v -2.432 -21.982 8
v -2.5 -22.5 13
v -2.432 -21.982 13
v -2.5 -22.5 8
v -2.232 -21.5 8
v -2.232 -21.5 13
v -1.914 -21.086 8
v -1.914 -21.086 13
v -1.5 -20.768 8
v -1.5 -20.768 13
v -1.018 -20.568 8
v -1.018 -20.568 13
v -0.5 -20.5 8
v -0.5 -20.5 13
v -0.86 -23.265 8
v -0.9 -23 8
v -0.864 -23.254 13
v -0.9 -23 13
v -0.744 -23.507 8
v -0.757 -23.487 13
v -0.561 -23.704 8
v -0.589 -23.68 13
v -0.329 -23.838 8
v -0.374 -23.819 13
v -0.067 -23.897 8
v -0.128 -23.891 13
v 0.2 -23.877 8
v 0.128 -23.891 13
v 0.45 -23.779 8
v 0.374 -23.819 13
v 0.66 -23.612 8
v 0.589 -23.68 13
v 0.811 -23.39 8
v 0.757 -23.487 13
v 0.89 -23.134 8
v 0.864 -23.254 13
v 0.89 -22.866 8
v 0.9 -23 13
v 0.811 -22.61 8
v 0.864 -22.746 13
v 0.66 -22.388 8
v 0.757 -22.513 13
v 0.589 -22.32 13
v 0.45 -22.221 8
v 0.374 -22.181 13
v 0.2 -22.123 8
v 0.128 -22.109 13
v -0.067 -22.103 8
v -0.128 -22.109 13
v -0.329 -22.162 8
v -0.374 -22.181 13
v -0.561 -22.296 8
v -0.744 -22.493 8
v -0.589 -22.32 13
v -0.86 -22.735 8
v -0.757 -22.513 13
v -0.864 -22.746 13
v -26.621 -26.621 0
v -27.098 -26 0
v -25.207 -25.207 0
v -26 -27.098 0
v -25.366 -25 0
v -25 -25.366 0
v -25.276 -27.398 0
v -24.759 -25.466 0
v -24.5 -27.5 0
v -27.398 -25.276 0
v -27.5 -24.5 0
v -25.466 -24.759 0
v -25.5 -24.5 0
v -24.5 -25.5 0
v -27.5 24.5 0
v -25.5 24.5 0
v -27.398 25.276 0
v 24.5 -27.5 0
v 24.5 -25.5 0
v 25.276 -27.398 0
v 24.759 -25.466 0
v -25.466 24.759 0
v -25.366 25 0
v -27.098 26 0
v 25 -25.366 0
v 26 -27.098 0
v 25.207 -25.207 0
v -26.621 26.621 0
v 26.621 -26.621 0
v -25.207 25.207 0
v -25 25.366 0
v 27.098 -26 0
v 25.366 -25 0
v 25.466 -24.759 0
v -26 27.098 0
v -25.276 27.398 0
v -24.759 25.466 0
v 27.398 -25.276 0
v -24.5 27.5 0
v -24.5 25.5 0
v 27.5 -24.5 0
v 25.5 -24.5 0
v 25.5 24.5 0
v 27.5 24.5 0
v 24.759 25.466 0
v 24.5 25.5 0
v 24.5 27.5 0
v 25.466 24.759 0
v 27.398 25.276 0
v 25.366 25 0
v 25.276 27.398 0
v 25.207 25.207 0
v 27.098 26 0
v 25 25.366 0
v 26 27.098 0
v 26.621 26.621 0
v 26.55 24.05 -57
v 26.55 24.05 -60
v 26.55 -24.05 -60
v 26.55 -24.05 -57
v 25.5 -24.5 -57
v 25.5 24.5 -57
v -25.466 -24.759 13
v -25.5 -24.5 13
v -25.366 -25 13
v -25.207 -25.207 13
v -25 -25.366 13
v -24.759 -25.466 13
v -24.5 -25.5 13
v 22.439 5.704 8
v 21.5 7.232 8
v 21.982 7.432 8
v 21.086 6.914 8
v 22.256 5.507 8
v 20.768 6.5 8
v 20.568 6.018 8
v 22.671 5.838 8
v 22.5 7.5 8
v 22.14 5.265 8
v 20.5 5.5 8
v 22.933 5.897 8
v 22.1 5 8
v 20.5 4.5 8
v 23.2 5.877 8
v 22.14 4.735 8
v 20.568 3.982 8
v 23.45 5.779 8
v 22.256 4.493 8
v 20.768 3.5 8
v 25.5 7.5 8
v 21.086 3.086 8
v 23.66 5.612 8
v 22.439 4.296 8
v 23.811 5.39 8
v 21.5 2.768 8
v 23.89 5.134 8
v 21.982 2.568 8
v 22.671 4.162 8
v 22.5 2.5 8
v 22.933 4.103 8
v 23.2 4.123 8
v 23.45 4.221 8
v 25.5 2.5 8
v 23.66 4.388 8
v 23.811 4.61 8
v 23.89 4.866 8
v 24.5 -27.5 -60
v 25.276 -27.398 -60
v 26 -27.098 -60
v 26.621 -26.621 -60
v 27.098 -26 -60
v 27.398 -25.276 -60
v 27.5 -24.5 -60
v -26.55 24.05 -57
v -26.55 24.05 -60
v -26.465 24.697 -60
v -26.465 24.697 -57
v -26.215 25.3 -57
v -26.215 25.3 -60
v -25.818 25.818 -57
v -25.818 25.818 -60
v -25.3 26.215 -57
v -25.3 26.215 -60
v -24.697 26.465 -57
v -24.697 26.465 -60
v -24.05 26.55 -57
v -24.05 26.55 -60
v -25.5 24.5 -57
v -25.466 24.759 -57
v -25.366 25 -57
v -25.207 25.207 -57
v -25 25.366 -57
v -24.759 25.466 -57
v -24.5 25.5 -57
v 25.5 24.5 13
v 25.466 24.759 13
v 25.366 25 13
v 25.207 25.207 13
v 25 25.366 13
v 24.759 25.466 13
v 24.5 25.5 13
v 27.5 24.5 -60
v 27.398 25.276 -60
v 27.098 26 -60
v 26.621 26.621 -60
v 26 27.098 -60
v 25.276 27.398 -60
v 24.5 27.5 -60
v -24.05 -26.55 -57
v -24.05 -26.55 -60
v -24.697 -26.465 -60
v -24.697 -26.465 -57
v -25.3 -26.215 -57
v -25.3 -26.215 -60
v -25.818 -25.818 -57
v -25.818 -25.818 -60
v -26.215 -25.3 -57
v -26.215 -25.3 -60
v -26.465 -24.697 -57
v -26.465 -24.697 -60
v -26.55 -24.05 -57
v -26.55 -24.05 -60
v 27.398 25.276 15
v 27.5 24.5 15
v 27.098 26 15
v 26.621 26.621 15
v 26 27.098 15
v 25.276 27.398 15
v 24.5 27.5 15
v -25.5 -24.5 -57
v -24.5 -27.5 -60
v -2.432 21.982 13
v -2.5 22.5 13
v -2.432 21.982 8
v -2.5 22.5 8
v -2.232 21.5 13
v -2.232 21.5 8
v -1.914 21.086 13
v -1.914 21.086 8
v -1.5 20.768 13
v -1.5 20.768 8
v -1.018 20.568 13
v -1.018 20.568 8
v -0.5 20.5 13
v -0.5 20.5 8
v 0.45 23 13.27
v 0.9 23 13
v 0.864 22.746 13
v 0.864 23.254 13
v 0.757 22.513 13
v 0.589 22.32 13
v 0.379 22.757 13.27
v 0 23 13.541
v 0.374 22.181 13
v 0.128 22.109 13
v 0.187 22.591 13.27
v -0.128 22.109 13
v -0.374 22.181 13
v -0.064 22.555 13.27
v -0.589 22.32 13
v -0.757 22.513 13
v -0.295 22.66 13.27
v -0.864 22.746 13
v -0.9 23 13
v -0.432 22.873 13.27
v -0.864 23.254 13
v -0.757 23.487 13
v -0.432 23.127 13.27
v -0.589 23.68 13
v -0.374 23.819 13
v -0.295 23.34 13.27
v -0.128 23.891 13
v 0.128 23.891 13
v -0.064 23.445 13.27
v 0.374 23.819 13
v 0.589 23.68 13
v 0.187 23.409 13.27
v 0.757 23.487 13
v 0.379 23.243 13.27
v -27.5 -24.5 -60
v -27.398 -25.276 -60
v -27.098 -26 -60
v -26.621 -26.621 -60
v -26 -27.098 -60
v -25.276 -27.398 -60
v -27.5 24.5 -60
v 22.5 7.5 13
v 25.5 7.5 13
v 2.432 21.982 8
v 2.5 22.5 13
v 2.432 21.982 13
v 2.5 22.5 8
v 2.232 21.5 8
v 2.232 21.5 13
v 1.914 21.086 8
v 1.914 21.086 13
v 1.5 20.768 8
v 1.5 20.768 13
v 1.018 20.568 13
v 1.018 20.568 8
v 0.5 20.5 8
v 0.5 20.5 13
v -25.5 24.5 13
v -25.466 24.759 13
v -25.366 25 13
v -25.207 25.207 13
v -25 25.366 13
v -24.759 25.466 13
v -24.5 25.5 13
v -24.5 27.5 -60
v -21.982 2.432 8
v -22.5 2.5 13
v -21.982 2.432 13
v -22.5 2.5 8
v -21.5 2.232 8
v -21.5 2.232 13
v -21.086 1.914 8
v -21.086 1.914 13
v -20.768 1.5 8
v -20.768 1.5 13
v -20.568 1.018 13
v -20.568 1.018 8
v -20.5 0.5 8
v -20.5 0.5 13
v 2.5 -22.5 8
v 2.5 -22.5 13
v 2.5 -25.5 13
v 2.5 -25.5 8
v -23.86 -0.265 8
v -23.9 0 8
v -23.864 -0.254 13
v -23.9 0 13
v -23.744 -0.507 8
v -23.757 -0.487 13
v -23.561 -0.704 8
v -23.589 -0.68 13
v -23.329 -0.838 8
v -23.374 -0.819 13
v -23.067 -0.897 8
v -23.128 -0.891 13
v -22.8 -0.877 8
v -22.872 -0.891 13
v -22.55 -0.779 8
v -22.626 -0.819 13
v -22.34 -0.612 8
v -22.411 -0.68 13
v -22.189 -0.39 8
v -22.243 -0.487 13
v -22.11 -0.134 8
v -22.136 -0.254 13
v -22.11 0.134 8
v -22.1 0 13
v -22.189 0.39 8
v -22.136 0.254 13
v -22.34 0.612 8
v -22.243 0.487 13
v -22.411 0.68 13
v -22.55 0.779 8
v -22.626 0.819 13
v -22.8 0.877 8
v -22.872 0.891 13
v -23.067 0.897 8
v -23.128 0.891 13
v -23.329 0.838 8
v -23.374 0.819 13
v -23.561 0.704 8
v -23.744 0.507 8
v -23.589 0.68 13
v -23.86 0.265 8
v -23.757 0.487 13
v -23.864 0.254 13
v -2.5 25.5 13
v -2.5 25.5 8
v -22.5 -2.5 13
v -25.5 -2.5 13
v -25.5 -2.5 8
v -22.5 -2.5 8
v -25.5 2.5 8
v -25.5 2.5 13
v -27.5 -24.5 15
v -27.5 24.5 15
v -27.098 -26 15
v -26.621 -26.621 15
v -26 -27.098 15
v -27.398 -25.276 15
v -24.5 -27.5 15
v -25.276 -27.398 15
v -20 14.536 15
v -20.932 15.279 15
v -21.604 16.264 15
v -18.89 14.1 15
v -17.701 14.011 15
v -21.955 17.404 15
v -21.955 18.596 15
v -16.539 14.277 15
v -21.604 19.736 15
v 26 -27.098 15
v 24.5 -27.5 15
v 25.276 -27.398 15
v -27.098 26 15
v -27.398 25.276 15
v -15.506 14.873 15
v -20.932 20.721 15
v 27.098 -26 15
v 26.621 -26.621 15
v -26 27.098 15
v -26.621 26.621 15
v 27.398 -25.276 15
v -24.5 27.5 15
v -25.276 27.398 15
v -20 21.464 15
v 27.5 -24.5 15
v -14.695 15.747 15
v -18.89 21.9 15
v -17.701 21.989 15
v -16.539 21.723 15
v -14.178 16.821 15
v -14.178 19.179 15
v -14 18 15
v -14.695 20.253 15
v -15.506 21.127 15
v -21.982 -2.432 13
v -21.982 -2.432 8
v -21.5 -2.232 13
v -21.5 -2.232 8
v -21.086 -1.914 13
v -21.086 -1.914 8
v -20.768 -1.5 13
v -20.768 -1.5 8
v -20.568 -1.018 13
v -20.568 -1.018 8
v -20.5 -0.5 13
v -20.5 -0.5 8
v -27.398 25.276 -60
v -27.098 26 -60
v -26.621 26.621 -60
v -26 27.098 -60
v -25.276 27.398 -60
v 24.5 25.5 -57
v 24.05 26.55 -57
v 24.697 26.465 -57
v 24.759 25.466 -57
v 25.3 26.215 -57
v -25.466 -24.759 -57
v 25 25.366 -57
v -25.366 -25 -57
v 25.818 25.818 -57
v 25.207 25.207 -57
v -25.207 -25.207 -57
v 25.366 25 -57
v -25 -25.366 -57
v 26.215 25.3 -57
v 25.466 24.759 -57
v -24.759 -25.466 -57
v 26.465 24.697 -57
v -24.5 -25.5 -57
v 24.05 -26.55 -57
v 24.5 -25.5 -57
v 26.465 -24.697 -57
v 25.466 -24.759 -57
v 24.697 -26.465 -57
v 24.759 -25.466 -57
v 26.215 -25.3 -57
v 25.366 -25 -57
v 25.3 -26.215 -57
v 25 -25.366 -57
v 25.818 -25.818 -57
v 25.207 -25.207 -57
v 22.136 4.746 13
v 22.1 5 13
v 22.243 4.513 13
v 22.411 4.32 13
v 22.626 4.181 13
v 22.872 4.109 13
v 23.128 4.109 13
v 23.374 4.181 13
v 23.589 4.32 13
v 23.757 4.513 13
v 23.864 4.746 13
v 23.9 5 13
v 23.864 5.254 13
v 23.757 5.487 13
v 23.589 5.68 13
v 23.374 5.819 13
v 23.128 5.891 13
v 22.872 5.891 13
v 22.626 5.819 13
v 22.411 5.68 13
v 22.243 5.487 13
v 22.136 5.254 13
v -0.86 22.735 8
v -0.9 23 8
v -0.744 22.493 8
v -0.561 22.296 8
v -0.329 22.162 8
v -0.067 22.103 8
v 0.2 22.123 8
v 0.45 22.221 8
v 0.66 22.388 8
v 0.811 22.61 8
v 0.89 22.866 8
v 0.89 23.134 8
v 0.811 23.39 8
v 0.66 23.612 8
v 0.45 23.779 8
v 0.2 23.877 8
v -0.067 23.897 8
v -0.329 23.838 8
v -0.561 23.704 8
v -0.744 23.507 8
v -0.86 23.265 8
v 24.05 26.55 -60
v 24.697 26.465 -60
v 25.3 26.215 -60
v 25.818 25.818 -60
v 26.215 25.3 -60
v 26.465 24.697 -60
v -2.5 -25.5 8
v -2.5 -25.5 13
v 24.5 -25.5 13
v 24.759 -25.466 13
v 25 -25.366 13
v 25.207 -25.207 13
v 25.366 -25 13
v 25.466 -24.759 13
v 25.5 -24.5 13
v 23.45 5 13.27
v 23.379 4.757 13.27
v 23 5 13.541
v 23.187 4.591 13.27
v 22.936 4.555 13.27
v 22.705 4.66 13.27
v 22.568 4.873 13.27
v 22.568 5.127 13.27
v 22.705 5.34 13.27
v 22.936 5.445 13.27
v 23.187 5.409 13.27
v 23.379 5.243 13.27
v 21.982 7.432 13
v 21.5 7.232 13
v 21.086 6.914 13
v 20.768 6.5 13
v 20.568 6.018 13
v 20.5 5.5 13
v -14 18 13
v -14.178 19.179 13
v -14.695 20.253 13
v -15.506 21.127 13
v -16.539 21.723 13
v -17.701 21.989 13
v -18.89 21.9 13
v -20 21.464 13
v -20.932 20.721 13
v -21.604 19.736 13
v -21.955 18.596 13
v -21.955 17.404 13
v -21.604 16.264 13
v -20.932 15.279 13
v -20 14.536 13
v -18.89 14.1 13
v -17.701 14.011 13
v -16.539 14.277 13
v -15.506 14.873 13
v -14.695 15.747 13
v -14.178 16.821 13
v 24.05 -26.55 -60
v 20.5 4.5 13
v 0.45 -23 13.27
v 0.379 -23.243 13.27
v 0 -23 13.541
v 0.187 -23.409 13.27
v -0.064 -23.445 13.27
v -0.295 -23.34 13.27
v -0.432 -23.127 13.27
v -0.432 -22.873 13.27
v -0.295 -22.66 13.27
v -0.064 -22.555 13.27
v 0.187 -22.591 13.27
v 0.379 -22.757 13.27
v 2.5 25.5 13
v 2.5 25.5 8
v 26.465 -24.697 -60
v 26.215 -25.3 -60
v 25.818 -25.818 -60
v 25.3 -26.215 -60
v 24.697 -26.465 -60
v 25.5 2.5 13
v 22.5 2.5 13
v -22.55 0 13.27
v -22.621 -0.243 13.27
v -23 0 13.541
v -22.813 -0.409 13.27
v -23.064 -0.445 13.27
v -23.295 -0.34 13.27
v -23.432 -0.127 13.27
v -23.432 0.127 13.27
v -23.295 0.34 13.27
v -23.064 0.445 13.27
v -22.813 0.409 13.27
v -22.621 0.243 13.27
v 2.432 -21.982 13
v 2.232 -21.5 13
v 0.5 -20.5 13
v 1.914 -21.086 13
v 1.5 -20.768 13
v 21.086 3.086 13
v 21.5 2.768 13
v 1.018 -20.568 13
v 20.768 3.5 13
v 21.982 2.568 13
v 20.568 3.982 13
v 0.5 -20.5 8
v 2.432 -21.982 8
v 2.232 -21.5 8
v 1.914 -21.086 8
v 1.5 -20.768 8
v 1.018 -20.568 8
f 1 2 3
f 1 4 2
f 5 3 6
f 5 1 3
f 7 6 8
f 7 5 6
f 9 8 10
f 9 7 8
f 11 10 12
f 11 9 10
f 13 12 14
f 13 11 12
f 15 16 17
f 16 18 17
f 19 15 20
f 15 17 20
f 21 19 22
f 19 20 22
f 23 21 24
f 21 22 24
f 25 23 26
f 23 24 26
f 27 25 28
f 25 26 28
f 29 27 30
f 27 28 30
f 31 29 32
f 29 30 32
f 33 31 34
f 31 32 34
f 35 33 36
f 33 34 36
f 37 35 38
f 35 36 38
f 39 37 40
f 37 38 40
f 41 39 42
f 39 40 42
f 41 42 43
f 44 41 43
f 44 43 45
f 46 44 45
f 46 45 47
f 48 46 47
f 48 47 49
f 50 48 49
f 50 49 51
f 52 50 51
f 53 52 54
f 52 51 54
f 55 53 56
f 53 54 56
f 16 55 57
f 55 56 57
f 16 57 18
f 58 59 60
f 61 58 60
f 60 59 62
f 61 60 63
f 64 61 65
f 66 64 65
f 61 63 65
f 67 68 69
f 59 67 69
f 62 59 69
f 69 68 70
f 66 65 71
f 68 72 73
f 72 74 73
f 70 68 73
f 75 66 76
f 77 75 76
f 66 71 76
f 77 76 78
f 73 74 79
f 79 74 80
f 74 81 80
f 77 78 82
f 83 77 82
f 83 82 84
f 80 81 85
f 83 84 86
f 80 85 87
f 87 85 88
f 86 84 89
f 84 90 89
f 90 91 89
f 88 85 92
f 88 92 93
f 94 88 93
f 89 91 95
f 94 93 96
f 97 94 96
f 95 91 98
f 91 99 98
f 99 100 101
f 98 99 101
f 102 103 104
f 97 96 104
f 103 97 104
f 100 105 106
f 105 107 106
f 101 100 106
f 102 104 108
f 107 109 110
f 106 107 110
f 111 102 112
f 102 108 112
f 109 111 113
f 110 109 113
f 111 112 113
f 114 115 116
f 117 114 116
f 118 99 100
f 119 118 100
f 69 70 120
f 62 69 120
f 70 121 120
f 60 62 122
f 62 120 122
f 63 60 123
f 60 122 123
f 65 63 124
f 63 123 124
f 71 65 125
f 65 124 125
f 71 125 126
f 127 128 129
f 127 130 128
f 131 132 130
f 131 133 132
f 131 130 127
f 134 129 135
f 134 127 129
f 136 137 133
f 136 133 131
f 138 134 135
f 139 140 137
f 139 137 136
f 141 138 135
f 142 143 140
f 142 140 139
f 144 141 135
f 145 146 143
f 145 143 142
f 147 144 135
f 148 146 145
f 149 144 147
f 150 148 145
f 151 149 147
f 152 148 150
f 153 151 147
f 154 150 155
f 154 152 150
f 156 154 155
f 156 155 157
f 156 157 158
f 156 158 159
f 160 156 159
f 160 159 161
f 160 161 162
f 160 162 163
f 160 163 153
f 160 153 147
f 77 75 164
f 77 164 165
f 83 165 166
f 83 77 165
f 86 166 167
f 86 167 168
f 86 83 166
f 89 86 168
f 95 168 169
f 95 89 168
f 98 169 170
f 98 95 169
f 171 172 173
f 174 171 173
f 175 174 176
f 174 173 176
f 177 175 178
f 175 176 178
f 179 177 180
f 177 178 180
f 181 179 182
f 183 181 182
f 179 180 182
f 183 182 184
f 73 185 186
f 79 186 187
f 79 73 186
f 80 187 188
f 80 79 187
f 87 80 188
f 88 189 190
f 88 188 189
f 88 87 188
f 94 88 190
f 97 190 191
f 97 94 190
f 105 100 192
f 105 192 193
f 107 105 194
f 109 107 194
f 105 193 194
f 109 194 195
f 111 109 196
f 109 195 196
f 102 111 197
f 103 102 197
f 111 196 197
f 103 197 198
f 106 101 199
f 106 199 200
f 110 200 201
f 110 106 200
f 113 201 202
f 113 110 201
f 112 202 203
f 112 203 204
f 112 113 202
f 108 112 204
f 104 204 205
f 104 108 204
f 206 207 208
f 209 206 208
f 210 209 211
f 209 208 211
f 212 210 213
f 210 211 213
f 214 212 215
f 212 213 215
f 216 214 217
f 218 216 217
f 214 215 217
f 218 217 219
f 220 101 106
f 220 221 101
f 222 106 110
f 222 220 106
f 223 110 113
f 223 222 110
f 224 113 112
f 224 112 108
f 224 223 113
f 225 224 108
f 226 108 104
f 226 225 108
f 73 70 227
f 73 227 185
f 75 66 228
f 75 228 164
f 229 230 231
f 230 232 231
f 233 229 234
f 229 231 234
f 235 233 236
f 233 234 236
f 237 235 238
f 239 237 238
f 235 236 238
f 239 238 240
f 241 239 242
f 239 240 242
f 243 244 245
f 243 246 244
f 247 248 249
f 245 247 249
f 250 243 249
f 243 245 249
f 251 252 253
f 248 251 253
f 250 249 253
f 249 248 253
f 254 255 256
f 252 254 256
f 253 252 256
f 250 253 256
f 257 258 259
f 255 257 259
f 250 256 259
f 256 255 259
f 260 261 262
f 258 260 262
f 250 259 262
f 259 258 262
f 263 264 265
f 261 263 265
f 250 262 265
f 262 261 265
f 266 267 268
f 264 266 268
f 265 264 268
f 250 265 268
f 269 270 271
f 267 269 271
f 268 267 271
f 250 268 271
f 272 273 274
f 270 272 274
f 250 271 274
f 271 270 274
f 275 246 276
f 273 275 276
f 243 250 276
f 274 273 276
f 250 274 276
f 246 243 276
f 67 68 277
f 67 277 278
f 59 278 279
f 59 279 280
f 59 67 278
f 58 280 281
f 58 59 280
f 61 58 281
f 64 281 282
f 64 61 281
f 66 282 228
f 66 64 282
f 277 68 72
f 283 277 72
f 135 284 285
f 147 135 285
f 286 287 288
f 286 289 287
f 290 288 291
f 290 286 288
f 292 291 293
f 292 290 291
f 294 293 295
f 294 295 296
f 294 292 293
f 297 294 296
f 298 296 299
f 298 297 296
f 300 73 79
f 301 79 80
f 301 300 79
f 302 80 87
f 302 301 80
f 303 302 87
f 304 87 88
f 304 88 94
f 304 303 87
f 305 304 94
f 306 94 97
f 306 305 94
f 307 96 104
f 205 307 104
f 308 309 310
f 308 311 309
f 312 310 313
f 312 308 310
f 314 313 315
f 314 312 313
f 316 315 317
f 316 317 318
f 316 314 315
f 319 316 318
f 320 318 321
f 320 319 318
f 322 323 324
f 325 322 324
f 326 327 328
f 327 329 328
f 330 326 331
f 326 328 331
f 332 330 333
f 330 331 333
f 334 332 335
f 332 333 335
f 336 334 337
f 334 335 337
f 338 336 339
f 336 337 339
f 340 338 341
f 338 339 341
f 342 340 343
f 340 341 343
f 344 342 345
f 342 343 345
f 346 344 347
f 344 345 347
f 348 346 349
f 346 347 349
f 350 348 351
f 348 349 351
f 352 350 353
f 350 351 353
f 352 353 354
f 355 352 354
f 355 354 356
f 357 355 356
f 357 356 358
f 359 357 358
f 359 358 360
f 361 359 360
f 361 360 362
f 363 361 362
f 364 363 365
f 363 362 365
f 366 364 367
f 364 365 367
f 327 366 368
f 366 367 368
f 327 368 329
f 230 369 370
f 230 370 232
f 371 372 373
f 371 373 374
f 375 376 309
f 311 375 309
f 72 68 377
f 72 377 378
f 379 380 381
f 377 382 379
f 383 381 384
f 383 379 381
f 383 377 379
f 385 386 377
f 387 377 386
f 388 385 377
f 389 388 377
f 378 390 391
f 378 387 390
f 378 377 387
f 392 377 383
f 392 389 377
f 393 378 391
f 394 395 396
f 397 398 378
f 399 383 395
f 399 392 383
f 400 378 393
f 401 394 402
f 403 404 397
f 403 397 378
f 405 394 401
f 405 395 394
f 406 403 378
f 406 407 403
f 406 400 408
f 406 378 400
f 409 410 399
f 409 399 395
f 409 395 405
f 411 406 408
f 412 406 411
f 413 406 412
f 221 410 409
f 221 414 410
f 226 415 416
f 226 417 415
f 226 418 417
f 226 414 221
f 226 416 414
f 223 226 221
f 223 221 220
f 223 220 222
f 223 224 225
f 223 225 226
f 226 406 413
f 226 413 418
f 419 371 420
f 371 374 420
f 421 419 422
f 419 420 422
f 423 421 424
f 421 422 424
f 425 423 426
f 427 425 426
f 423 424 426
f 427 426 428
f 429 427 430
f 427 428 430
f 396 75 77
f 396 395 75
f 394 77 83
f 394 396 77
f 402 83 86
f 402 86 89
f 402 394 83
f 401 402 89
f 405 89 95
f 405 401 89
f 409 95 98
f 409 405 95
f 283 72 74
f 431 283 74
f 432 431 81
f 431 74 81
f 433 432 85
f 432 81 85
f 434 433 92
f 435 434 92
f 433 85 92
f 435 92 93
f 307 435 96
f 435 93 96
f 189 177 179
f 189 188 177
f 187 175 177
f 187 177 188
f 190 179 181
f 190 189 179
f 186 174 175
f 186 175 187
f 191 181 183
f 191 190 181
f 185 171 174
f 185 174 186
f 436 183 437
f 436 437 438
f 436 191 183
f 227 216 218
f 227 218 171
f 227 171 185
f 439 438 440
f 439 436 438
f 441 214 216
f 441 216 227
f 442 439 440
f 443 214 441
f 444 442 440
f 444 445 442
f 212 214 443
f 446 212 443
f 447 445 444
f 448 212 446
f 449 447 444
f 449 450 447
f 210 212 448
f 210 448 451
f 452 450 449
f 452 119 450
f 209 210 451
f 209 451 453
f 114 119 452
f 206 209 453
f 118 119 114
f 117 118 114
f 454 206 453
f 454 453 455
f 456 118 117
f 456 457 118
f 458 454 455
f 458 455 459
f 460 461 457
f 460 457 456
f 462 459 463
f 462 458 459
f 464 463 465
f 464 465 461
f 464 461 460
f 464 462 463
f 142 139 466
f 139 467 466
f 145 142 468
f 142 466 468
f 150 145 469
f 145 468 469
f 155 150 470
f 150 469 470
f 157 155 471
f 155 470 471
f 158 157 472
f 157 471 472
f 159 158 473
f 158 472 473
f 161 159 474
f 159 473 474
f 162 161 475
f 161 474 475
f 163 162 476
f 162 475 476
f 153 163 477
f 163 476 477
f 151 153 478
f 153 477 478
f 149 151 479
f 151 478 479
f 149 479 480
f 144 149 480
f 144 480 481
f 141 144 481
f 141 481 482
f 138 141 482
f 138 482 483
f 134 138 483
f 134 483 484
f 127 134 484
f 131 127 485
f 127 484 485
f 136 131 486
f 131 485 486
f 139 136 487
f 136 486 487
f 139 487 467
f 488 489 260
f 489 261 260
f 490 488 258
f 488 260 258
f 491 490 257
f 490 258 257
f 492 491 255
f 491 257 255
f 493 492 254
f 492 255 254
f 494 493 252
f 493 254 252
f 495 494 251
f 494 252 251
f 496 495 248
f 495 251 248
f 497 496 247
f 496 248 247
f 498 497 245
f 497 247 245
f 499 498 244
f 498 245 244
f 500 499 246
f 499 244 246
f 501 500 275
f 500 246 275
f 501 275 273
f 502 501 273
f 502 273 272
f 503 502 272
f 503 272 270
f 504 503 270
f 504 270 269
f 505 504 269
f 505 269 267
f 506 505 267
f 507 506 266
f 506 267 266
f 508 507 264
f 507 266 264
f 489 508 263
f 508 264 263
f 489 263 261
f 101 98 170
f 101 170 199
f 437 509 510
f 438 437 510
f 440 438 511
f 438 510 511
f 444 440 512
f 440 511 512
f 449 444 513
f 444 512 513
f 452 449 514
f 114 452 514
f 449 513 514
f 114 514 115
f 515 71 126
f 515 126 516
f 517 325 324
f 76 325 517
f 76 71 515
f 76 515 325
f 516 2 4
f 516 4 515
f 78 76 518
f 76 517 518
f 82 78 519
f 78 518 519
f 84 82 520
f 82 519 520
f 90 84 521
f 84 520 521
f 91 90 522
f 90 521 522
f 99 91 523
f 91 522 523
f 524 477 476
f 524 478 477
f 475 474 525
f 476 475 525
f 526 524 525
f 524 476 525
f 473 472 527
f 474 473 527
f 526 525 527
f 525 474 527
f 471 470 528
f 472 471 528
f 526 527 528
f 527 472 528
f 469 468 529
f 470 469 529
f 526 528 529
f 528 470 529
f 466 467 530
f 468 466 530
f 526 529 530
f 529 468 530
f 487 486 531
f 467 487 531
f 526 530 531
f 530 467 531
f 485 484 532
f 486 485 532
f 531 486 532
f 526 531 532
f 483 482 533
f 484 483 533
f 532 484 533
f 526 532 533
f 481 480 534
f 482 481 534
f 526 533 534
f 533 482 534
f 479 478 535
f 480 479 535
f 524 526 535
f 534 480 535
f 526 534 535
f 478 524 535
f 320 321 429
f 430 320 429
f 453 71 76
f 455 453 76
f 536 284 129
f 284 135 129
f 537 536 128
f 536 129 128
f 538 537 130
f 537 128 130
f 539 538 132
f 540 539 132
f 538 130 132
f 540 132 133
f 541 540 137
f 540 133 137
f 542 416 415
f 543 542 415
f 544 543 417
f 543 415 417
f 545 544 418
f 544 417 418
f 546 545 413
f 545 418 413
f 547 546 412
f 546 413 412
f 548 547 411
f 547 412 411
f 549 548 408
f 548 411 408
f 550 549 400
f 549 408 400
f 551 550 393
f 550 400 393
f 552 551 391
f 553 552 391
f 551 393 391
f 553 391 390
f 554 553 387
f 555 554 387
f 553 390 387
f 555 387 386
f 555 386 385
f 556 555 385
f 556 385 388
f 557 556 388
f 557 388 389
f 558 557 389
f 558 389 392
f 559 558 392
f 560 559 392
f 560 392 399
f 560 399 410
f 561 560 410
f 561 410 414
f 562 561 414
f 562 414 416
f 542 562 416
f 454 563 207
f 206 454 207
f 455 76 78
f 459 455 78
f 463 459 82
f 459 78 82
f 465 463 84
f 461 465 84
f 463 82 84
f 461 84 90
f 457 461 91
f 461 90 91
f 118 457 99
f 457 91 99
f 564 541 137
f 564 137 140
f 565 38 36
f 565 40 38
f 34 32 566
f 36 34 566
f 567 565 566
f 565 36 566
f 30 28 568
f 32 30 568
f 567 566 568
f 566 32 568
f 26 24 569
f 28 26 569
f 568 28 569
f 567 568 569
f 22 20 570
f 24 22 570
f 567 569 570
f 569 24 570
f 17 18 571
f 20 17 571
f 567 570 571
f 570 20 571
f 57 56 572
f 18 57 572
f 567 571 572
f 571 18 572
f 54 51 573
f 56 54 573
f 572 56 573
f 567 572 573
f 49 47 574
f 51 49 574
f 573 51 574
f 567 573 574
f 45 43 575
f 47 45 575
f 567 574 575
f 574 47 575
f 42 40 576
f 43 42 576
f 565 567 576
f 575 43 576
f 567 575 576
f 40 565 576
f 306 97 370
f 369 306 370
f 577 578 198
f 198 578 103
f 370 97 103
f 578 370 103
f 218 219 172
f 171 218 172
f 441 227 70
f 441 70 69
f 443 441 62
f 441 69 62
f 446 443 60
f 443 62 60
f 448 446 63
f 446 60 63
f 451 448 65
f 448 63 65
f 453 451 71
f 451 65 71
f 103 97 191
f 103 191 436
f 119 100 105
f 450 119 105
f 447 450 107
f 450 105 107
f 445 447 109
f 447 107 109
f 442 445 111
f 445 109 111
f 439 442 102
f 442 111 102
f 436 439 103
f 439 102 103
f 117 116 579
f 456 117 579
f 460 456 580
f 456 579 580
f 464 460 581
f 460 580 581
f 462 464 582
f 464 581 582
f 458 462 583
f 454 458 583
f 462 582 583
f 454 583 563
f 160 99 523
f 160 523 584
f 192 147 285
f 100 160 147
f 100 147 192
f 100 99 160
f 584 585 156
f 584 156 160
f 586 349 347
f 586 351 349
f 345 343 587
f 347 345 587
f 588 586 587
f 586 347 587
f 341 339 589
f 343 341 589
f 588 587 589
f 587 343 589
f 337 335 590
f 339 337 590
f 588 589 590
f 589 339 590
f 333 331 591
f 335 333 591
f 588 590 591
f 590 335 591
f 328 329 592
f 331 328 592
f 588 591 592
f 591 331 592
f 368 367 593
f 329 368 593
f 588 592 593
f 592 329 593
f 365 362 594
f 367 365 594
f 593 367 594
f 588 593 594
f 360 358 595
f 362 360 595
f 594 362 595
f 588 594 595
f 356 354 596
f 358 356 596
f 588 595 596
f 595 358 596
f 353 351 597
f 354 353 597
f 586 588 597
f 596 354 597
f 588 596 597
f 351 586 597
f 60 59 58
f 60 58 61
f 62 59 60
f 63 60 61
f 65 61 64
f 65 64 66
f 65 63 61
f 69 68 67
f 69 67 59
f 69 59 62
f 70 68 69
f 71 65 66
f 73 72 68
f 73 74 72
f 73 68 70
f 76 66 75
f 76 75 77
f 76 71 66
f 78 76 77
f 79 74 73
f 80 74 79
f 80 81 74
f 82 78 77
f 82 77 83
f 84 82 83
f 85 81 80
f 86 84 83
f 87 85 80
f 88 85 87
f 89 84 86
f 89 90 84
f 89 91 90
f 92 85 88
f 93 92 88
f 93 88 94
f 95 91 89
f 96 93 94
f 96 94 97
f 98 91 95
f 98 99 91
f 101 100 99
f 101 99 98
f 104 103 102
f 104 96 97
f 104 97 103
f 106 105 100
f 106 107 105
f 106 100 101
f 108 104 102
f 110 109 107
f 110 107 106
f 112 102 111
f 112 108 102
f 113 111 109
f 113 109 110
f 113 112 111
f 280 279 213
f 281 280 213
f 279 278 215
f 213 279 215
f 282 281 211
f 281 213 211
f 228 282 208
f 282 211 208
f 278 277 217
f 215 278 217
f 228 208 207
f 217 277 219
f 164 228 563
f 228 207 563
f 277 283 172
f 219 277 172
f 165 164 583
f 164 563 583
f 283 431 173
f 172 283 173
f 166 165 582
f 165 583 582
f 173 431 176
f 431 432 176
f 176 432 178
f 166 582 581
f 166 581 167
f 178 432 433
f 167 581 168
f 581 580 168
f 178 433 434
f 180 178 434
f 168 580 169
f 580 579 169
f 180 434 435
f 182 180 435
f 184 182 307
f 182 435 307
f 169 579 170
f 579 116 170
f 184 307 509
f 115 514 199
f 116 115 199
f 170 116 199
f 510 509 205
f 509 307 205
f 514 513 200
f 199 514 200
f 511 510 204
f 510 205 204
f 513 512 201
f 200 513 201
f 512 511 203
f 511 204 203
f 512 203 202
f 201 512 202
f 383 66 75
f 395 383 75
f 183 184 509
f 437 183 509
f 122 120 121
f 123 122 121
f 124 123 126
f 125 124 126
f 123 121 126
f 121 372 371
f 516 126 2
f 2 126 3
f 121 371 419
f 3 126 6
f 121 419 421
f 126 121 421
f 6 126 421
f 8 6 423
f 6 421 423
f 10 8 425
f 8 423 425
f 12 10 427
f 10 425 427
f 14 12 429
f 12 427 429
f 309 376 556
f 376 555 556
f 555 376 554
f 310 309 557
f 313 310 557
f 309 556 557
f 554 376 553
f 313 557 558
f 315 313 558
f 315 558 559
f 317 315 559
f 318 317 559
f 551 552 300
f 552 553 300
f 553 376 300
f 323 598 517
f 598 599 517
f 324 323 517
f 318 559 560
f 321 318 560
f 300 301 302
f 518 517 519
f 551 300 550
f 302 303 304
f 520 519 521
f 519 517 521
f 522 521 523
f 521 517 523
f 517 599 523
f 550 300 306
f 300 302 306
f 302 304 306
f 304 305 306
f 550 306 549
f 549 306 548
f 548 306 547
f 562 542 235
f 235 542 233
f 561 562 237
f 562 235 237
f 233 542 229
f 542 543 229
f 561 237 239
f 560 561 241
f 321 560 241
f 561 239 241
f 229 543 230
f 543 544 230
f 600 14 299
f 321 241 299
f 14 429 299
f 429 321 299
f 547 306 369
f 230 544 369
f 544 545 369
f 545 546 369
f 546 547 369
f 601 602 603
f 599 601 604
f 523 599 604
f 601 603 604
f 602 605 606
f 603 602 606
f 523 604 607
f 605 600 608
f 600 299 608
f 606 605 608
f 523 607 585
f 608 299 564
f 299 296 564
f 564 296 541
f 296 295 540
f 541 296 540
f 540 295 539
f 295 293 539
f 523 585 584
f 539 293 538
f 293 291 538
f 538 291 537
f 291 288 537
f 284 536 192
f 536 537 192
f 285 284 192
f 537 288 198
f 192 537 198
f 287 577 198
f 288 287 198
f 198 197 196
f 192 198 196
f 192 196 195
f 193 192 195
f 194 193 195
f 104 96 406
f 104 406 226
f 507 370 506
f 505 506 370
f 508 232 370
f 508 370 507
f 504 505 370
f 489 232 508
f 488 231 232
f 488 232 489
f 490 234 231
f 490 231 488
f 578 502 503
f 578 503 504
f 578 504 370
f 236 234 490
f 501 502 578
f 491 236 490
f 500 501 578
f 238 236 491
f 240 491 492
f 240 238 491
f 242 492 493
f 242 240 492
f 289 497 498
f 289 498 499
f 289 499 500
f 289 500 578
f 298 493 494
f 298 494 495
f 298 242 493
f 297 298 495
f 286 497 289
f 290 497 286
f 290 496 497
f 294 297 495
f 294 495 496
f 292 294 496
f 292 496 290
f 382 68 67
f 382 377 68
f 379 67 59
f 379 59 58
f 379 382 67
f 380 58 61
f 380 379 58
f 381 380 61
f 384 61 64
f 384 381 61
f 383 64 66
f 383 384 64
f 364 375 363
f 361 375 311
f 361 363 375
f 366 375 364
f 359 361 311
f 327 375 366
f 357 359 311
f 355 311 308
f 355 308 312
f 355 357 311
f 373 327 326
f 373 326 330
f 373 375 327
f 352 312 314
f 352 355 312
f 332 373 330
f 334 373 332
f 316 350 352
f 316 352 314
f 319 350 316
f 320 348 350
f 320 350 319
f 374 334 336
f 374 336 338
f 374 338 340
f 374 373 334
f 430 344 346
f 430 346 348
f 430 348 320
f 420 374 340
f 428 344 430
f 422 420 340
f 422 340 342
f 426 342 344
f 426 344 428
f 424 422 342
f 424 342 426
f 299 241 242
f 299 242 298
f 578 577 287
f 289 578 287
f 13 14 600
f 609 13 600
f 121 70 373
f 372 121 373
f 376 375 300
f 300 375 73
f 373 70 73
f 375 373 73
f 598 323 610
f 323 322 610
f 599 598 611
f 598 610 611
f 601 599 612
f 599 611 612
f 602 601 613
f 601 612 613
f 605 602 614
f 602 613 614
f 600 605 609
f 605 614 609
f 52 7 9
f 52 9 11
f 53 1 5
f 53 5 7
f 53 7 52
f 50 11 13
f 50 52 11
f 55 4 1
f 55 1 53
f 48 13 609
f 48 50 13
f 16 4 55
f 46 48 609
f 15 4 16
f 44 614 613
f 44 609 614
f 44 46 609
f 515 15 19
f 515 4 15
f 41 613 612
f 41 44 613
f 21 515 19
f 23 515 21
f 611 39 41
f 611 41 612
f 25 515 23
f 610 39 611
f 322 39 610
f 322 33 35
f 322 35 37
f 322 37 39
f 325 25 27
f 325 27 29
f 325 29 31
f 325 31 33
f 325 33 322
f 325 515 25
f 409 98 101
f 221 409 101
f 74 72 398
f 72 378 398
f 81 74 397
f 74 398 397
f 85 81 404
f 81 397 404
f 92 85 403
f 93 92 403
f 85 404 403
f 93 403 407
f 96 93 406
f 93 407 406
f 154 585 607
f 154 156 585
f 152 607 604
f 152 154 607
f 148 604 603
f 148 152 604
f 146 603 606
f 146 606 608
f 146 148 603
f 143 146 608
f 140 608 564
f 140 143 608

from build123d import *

# Parameters (mm, degrees)
F0_W      = 55
F0_H      = 55
F1_DEPTH  = 15
F2_R      = 3
F3_T      = -2
F4_R      = 4
F5_DEPTH  = 25
F6_DEPTH  = 60
F8_DEPTH  = 3
F9_W      = 5
F9_H      = 5
F10_DEPTH = 5
F11_R     = 2
F13_D     = 1.8
F13_DEPTH = 5
F13_TIP   = 0.5407745571


# Not quite as in the source:
# - a feature names something its author has since deleted; it is built from what else it names


with BuildPart() as f1:
    # F0 (on Top) → F1 (new body)
    with BuildSketch(Plane.XY):
        Rectangle(F0_W, F0_H)
    extrude(amount=F1_DEPTH)

    # F2
    f2_edges = [f1.edges().sort_by_distance(p)[0] for p in [
        (-27.5, 27.5, 7.5),
        (-27.5, -27.5, 7.5),
        (27.5, -27.5, 7.5),
        (27.5, 27.5, 7.5),
    ]]
    fillet(f2_edges, radius=F2_R)

    # F3
    f3_openings = [f1.faces().sort_by_distance(p)[0] for p in [
        (0, 0, 0),
    ]]
    offset(amount=F3_T, openings=f3_openings)

    # F4 (on face) → F5 (cut)
    with BuildSketch(Plane.XY.offset(15)):
        with Locations((-18, 18)):
            Circle(F4_R)
    extrude(amount=-F5_DEPTH, mode=Mode.SUBTRACT)


with BuildPart() as f6:
    # F6 (new): a face of the model
    f6_faces = [f1.part.faces().sort_by_distance(p)[0] for p in [
        (0, -26.7221825407, 0),
    ]]
    extrude(f6_faces, amount=F6_DEPTH)

    # F7 (on face) → F8 (cut)
    with BuildSketch(Plane(origin=(0, 0, -60), x_dir=(1, 0, 0), z_dir=(0, 0, -1))):
        with BuildLine():
            Line((-24.05, -26.55), (24.05, -26.55))
            ThreePointArc((24.05, -26.55), (25.817766953, -25.817766953), (26.55, -24.05))
            Line((26.55, -24.05), (26.55, 24.05))
            ThreePointArc((26.55, 24.05), (25.817766953, 25.817766953), (24.05, 26.55))
            Line((24.05, 26.55), (-24.05, 26.55))
            ThreePointArc((-24.05, 26.55), (-25.817766953, 25.817766953), (-26.55, 24.05))
            Line((-26.55, 24.05), (-26.55, -24.05))
            ThreePointArc((-26.55, -24.05), (-25.817766953, -25.817766953), (-24.05, -26.55))
        make_face()
    extrude(amount=-F8_DEPTH, mode=Mode.SUBTRACT)


with BuildPart() as f1_1:
    add(f1.part)

    # F9 (on face) → F10 (join)
    with BuildSketch(Plane(origin=(0, 0, 13), x_dir=(1, 0, 0), z_dir=(0, 0, -1))):
        with Locations((-23, 0)):
            Rectangle(F9_W, F9_H)
        with Locations((0, -23)):
            Rectangle(F9_W, F9_H)
        with Locations((0, 23)):
            Rectangle(F9_W, F9_H)
        with Locations((23, -5)):
            Rectangle(F9_W, F9_H)
    extrude(amount=F10_DEPTH)

    # F11
    f11_edges = [f1_1.edges().sort_by_distance(p)[0] for p in [
        (-20.5, 2.5, 10.5),
        (-20.5, -2.5, 10.5),
        (2.5, 20.5, 10.5),
        (-2.5, 20.5, 10.5),
        (-2.5, -20.5, 10.5),
        (2.5, -20.5, 10.5),
        (20.5, 2.5, 10.5),
        (20.5, 7.5, 10.5),
    ]]
    fillet(f11_edges, radius=F11_R)

    # F13
    with Locations(Plane(origin=(0, 0, 8), x_dir=(1, 0, 0), z_dir=(0, 0, -1))):
        with Locations((23, -5), (0, -23), (0, 23), (-23, 0)):
            Hole(F13_D / 2, depth=F13_DEPTH)
            with Locations((0, 0, -(F13_DEPTH + F13_TIP / 2))):  # 118° drill point
                Cone(0, F13_D / 2, F13_TIP, mode=Mode.SUBTRACT)


solid = Compound([f6.part, f1_1.part])
